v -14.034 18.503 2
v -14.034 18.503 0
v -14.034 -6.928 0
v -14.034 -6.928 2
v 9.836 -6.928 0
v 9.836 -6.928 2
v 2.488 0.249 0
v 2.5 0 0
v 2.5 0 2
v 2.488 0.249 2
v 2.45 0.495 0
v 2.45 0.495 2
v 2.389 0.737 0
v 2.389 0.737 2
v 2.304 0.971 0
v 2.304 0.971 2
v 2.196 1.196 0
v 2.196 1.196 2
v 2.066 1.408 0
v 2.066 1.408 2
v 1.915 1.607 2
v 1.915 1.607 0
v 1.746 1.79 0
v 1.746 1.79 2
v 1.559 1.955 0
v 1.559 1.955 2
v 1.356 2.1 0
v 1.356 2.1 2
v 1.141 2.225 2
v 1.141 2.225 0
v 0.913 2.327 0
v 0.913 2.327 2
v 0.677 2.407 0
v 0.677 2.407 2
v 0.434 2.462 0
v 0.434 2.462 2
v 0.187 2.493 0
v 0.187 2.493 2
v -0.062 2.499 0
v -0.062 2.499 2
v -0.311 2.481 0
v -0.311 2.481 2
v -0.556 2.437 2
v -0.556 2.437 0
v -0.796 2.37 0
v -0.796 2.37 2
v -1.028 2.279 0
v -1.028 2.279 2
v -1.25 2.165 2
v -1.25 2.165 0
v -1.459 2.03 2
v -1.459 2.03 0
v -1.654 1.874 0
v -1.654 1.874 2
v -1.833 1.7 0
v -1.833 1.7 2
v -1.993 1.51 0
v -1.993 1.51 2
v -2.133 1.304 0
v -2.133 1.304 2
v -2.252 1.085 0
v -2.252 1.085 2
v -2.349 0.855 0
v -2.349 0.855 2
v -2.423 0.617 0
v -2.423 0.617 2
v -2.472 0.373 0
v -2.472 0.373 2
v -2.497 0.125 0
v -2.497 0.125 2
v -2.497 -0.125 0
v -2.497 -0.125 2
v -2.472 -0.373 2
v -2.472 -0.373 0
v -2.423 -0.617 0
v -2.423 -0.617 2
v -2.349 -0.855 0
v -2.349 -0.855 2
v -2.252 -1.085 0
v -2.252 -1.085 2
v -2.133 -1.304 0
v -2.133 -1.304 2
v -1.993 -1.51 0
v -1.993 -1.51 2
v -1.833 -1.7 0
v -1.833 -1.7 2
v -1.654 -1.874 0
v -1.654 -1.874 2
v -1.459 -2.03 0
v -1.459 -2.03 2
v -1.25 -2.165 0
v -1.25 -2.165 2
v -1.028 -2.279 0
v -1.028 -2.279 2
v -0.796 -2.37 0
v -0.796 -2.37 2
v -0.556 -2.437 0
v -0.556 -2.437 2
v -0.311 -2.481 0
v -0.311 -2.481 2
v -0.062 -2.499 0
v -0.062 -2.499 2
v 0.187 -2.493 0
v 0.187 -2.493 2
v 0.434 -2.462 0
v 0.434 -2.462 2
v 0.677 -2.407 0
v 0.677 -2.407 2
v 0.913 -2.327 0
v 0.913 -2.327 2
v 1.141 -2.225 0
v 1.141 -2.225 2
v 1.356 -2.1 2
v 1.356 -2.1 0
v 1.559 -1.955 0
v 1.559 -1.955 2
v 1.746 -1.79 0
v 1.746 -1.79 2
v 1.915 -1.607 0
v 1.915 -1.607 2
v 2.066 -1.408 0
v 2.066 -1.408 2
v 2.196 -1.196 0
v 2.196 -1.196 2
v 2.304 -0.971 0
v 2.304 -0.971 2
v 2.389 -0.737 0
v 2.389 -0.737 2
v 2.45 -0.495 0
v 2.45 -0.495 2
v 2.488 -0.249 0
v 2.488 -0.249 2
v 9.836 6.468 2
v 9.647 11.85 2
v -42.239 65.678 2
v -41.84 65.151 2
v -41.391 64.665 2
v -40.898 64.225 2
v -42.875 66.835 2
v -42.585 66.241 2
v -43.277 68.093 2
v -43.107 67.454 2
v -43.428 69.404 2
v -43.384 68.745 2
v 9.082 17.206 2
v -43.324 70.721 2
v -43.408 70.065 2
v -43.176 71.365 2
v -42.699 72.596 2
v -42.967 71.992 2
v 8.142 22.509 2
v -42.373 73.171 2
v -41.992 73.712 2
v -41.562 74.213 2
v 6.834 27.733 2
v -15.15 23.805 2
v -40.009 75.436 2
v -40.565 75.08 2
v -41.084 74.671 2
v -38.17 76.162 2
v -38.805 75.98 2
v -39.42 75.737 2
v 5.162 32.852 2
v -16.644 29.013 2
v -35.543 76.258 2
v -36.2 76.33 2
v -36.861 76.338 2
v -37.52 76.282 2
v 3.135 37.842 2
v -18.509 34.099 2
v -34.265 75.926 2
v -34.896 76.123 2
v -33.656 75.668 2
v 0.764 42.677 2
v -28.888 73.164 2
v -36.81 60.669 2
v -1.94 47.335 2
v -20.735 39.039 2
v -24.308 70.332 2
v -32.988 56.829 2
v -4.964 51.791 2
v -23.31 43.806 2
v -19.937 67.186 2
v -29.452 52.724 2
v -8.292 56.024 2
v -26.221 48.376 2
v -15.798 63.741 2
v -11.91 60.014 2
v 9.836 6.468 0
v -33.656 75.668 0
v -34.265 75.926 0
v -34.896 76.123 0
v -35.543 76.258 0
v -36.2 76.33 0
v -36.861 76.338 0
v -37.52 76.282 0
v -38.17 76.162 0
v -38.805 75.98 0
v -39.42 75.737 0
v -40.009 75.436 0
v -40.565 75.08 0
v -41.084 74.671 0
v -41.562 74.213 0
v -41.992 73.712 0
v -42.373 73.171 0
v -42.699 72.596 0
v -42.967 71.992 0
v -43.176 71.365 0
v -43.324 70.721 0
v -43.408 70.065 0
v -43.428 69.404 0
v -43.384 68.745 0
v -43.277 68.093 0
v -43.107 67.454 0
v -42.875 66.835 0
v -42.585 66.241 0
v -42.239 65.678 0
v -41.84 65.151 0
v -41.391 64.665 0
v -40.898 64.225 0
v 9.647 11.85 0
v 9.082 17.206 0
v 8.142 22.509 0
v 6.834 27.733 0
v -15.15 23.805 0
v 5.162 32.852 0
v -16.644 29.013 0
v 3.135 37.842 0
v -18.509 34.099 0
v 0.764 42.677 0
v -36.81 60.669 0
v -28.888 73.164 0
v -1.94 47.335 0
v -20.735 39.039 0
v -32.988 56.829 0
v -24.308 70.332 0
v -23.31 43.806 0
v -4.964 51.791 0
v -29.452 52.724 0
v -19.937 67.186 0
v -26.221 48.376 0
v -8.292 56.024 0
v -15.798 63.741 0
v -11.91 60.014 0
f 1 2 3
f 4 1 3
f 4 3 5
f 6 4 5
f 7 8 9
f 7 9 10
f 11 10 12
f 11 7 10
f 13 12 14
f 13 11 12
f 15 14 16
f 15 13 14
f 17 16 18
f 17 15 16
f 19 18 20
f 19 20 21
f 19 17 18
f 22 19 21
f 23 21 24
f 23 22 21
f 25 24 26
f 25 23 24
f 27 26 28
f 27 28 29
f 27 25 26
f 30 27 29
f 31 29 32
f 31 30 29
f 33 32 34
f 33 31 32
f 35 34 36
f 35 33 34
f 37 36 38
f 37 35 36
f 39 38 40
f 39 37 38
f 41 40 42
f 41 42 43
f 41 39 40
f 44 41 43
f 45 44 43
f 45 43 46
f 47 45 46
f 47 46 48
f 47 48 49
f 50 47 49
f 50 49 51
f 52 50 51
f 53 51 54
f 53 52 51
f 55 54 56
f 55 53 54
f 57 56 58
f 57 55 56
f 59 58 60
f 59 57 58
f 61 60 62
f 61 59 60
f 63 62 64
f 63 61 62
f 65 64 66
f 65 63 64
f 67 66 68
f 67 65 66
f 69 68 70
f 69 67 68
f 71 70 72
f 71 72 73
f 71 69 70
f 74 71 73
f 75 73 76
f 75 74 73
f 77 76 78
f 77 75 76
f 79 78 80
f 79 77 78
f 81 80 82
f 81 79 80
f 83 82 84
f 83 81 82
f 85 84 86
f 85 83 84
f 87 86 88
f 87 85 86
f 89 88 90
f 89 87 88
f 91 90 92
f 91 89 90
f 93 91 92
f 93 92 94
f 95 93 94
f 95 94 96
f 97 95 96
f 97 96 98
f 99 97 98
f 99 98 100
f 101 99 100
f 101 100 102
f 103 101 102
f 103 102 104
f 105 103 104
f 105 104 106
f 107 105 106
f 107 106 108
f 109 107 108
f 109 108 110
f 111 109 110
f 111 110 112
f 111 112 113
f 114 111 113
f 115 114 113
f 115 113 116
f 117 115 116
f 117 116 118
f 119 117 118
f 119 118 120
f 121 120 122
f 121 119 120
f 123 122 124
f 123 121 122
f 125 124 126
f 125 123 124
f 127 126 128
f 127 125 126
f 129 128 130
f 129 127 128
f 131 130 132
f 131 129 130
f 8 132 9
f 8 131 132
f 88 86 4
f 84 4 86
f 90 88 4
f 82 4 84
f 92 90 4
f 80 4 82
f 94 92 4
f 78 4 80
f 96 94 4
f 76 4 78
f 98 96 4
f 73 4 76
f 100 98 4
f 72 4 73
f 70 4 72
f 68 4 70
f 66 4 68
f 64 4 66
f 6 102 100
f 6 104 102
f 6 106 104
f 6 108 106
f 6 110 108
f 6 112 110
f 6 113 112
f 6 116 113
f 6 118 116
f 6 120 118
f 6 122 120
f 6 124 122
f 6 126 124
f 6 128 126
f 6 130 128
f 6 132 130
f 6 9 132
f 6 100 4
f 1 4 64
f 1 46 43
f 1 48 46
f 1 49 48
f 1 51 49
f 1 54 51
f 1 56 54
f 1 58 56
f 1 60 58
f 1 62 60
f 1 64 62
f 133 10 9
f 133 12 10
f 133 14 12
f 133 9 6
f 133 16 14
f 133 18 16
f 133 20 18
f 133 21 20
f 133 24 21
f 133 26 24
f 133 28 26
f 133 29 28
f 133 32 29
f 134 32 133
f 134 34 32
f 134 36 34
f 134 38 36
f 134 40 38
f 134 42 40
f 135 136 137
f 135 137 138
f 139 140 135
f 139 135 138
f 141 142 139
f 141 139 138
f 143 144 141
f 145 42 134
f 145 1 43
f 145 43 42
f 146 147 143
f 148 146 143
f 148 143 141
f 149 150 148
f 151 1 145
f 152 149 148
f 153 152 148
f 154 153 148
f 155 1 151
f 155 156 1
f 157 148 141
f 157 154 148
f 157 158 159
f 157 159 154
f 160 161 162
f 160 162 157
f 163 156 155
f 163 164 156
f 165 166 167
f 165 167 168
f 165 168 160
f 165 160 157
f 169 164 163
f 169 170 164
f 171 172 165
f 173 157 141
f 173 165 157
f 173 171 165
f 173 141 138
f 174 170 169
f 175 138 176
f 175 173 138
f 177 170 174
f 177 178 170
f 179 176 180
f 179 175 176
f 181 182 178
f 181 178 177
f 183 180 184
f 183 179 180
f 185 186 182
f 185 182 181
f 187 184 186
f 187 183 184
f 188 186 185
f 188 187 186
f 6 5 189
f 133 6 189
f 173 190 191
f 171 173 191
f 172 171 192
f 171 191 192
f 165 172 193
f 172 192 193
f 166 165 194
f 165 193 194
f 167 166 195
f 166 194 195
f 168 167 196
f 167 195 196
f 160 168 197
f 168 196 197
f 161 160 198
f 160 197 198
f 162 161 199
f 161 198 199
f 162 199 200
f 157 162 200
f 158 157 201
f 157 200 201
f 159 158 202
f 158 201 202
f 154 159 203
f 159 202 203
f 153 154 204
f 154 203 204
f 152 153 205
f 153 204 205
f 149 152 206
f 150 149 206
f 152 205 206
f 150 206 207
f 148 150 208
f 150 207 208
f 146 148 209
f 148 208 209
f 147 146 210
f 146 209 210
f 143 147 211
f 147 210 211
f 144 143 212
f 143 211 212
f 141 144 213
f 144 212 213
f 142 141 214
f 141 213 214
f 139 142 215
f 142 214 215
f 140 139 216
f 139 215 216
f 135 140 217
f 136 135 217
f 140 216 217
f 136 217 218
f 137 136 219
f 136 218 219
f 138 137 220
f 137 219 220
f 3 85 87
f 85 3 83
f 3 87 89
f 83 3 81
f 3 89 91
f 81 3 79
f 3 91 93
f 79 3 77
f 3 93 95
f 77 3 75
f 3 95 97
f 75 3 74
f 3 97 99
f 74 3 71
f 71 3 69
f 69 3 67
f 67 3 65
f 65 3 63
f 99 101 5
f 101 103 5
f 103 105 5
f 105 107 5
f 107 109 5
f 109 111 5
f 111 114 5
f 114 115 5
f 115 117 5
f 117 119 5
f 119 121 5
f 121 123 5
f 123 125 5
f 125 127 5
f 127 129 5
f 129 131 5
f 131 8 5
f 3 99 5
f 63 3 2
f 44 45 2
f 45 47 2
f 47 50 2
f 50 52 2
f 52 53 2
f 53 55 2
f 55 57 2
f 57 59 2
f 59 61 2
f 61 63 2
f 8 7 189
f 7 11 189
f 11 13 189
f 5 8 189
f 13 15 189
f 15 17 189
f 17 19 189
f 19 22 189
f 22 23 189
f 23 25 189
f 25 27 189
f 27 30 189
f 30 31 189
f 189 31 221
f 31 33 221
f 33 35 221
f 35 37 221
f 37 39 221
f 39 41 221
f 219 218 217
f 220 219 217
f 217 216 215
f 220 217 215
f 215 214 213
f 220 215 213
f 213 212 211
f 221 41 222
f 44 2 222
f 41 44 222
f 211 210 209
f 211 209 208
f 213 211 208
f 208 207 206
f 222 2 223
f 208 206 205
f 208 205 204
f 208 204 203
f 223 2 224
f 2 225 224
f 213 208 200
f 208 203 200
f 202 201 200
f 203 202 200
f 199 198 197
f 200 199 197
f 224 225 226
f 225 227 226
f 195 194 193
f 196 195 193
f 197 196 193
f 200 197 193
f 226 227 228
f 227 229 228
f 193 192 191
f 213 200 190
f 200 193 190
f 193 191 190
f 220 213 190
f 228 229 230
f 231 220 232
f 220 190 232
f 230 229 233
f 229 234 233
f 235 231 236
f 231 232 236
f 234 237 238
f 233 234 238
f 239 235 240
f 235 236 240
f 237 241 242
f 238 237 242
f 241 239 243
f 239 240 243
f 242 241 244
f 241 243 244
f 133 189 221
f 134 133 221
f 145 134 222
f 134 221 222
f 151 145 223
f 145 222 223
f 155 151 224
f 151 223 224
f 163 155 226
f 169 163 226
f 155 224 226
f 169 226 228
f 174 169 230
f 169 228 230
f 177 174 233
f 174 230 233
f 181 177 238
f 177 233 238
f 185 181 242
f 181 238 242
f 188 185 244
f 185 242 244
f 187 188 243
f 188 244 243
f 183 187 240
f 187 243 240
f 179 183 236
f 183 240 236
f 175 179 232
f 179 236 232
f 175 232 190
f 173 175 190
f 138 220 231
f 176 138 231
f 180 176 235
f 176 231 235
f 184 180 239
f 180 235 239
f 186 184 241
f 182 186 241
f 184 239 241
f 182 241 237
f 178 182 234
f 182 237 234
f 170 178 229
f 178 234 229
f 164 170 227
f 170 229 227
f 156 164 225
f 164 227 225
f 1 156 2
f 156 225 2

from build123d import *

# Parameters (mm, degrees)
SKETCH_1_R      = 2.5
EXTRUDE_1_DEPTH = 2


with BuildPart() as part:
    # Эскиз1 → Бобышка-Вытянуть1 (new body)
    with BuildSketch(Plane.XY):
        with BuildLine():
            Line((-14.033668667, -6.927741673), (9.836212535, -6.927741673))
            Line((9.836212535, -6.927741673), (9.836212535, 6.468384532))
            ThreePointArc((9.836212535, 6.468384532), (-1.939735679, 47.334627745), (-33.656179922, 75.668175974))
            ThreePointArc((-33.656179922, 75.668175974), (-42.372566631, 73.171176021), (-40.898194288, 64.224856542))
            ThreePointArc((-40.898194288, 64.224856542), (-23.309833652, 43.806018062), (-14.033668667, 18.503208773))
            Line((-14.033668667, 18.503208773), (-14.033668667, -6.927741673))
        make_face()
        Circle(SKETCH_1_R, mode=Mode.SUBTRACT)
    extrude(amount=EXTRUDE_1_DEPTH)


solid = part.part
